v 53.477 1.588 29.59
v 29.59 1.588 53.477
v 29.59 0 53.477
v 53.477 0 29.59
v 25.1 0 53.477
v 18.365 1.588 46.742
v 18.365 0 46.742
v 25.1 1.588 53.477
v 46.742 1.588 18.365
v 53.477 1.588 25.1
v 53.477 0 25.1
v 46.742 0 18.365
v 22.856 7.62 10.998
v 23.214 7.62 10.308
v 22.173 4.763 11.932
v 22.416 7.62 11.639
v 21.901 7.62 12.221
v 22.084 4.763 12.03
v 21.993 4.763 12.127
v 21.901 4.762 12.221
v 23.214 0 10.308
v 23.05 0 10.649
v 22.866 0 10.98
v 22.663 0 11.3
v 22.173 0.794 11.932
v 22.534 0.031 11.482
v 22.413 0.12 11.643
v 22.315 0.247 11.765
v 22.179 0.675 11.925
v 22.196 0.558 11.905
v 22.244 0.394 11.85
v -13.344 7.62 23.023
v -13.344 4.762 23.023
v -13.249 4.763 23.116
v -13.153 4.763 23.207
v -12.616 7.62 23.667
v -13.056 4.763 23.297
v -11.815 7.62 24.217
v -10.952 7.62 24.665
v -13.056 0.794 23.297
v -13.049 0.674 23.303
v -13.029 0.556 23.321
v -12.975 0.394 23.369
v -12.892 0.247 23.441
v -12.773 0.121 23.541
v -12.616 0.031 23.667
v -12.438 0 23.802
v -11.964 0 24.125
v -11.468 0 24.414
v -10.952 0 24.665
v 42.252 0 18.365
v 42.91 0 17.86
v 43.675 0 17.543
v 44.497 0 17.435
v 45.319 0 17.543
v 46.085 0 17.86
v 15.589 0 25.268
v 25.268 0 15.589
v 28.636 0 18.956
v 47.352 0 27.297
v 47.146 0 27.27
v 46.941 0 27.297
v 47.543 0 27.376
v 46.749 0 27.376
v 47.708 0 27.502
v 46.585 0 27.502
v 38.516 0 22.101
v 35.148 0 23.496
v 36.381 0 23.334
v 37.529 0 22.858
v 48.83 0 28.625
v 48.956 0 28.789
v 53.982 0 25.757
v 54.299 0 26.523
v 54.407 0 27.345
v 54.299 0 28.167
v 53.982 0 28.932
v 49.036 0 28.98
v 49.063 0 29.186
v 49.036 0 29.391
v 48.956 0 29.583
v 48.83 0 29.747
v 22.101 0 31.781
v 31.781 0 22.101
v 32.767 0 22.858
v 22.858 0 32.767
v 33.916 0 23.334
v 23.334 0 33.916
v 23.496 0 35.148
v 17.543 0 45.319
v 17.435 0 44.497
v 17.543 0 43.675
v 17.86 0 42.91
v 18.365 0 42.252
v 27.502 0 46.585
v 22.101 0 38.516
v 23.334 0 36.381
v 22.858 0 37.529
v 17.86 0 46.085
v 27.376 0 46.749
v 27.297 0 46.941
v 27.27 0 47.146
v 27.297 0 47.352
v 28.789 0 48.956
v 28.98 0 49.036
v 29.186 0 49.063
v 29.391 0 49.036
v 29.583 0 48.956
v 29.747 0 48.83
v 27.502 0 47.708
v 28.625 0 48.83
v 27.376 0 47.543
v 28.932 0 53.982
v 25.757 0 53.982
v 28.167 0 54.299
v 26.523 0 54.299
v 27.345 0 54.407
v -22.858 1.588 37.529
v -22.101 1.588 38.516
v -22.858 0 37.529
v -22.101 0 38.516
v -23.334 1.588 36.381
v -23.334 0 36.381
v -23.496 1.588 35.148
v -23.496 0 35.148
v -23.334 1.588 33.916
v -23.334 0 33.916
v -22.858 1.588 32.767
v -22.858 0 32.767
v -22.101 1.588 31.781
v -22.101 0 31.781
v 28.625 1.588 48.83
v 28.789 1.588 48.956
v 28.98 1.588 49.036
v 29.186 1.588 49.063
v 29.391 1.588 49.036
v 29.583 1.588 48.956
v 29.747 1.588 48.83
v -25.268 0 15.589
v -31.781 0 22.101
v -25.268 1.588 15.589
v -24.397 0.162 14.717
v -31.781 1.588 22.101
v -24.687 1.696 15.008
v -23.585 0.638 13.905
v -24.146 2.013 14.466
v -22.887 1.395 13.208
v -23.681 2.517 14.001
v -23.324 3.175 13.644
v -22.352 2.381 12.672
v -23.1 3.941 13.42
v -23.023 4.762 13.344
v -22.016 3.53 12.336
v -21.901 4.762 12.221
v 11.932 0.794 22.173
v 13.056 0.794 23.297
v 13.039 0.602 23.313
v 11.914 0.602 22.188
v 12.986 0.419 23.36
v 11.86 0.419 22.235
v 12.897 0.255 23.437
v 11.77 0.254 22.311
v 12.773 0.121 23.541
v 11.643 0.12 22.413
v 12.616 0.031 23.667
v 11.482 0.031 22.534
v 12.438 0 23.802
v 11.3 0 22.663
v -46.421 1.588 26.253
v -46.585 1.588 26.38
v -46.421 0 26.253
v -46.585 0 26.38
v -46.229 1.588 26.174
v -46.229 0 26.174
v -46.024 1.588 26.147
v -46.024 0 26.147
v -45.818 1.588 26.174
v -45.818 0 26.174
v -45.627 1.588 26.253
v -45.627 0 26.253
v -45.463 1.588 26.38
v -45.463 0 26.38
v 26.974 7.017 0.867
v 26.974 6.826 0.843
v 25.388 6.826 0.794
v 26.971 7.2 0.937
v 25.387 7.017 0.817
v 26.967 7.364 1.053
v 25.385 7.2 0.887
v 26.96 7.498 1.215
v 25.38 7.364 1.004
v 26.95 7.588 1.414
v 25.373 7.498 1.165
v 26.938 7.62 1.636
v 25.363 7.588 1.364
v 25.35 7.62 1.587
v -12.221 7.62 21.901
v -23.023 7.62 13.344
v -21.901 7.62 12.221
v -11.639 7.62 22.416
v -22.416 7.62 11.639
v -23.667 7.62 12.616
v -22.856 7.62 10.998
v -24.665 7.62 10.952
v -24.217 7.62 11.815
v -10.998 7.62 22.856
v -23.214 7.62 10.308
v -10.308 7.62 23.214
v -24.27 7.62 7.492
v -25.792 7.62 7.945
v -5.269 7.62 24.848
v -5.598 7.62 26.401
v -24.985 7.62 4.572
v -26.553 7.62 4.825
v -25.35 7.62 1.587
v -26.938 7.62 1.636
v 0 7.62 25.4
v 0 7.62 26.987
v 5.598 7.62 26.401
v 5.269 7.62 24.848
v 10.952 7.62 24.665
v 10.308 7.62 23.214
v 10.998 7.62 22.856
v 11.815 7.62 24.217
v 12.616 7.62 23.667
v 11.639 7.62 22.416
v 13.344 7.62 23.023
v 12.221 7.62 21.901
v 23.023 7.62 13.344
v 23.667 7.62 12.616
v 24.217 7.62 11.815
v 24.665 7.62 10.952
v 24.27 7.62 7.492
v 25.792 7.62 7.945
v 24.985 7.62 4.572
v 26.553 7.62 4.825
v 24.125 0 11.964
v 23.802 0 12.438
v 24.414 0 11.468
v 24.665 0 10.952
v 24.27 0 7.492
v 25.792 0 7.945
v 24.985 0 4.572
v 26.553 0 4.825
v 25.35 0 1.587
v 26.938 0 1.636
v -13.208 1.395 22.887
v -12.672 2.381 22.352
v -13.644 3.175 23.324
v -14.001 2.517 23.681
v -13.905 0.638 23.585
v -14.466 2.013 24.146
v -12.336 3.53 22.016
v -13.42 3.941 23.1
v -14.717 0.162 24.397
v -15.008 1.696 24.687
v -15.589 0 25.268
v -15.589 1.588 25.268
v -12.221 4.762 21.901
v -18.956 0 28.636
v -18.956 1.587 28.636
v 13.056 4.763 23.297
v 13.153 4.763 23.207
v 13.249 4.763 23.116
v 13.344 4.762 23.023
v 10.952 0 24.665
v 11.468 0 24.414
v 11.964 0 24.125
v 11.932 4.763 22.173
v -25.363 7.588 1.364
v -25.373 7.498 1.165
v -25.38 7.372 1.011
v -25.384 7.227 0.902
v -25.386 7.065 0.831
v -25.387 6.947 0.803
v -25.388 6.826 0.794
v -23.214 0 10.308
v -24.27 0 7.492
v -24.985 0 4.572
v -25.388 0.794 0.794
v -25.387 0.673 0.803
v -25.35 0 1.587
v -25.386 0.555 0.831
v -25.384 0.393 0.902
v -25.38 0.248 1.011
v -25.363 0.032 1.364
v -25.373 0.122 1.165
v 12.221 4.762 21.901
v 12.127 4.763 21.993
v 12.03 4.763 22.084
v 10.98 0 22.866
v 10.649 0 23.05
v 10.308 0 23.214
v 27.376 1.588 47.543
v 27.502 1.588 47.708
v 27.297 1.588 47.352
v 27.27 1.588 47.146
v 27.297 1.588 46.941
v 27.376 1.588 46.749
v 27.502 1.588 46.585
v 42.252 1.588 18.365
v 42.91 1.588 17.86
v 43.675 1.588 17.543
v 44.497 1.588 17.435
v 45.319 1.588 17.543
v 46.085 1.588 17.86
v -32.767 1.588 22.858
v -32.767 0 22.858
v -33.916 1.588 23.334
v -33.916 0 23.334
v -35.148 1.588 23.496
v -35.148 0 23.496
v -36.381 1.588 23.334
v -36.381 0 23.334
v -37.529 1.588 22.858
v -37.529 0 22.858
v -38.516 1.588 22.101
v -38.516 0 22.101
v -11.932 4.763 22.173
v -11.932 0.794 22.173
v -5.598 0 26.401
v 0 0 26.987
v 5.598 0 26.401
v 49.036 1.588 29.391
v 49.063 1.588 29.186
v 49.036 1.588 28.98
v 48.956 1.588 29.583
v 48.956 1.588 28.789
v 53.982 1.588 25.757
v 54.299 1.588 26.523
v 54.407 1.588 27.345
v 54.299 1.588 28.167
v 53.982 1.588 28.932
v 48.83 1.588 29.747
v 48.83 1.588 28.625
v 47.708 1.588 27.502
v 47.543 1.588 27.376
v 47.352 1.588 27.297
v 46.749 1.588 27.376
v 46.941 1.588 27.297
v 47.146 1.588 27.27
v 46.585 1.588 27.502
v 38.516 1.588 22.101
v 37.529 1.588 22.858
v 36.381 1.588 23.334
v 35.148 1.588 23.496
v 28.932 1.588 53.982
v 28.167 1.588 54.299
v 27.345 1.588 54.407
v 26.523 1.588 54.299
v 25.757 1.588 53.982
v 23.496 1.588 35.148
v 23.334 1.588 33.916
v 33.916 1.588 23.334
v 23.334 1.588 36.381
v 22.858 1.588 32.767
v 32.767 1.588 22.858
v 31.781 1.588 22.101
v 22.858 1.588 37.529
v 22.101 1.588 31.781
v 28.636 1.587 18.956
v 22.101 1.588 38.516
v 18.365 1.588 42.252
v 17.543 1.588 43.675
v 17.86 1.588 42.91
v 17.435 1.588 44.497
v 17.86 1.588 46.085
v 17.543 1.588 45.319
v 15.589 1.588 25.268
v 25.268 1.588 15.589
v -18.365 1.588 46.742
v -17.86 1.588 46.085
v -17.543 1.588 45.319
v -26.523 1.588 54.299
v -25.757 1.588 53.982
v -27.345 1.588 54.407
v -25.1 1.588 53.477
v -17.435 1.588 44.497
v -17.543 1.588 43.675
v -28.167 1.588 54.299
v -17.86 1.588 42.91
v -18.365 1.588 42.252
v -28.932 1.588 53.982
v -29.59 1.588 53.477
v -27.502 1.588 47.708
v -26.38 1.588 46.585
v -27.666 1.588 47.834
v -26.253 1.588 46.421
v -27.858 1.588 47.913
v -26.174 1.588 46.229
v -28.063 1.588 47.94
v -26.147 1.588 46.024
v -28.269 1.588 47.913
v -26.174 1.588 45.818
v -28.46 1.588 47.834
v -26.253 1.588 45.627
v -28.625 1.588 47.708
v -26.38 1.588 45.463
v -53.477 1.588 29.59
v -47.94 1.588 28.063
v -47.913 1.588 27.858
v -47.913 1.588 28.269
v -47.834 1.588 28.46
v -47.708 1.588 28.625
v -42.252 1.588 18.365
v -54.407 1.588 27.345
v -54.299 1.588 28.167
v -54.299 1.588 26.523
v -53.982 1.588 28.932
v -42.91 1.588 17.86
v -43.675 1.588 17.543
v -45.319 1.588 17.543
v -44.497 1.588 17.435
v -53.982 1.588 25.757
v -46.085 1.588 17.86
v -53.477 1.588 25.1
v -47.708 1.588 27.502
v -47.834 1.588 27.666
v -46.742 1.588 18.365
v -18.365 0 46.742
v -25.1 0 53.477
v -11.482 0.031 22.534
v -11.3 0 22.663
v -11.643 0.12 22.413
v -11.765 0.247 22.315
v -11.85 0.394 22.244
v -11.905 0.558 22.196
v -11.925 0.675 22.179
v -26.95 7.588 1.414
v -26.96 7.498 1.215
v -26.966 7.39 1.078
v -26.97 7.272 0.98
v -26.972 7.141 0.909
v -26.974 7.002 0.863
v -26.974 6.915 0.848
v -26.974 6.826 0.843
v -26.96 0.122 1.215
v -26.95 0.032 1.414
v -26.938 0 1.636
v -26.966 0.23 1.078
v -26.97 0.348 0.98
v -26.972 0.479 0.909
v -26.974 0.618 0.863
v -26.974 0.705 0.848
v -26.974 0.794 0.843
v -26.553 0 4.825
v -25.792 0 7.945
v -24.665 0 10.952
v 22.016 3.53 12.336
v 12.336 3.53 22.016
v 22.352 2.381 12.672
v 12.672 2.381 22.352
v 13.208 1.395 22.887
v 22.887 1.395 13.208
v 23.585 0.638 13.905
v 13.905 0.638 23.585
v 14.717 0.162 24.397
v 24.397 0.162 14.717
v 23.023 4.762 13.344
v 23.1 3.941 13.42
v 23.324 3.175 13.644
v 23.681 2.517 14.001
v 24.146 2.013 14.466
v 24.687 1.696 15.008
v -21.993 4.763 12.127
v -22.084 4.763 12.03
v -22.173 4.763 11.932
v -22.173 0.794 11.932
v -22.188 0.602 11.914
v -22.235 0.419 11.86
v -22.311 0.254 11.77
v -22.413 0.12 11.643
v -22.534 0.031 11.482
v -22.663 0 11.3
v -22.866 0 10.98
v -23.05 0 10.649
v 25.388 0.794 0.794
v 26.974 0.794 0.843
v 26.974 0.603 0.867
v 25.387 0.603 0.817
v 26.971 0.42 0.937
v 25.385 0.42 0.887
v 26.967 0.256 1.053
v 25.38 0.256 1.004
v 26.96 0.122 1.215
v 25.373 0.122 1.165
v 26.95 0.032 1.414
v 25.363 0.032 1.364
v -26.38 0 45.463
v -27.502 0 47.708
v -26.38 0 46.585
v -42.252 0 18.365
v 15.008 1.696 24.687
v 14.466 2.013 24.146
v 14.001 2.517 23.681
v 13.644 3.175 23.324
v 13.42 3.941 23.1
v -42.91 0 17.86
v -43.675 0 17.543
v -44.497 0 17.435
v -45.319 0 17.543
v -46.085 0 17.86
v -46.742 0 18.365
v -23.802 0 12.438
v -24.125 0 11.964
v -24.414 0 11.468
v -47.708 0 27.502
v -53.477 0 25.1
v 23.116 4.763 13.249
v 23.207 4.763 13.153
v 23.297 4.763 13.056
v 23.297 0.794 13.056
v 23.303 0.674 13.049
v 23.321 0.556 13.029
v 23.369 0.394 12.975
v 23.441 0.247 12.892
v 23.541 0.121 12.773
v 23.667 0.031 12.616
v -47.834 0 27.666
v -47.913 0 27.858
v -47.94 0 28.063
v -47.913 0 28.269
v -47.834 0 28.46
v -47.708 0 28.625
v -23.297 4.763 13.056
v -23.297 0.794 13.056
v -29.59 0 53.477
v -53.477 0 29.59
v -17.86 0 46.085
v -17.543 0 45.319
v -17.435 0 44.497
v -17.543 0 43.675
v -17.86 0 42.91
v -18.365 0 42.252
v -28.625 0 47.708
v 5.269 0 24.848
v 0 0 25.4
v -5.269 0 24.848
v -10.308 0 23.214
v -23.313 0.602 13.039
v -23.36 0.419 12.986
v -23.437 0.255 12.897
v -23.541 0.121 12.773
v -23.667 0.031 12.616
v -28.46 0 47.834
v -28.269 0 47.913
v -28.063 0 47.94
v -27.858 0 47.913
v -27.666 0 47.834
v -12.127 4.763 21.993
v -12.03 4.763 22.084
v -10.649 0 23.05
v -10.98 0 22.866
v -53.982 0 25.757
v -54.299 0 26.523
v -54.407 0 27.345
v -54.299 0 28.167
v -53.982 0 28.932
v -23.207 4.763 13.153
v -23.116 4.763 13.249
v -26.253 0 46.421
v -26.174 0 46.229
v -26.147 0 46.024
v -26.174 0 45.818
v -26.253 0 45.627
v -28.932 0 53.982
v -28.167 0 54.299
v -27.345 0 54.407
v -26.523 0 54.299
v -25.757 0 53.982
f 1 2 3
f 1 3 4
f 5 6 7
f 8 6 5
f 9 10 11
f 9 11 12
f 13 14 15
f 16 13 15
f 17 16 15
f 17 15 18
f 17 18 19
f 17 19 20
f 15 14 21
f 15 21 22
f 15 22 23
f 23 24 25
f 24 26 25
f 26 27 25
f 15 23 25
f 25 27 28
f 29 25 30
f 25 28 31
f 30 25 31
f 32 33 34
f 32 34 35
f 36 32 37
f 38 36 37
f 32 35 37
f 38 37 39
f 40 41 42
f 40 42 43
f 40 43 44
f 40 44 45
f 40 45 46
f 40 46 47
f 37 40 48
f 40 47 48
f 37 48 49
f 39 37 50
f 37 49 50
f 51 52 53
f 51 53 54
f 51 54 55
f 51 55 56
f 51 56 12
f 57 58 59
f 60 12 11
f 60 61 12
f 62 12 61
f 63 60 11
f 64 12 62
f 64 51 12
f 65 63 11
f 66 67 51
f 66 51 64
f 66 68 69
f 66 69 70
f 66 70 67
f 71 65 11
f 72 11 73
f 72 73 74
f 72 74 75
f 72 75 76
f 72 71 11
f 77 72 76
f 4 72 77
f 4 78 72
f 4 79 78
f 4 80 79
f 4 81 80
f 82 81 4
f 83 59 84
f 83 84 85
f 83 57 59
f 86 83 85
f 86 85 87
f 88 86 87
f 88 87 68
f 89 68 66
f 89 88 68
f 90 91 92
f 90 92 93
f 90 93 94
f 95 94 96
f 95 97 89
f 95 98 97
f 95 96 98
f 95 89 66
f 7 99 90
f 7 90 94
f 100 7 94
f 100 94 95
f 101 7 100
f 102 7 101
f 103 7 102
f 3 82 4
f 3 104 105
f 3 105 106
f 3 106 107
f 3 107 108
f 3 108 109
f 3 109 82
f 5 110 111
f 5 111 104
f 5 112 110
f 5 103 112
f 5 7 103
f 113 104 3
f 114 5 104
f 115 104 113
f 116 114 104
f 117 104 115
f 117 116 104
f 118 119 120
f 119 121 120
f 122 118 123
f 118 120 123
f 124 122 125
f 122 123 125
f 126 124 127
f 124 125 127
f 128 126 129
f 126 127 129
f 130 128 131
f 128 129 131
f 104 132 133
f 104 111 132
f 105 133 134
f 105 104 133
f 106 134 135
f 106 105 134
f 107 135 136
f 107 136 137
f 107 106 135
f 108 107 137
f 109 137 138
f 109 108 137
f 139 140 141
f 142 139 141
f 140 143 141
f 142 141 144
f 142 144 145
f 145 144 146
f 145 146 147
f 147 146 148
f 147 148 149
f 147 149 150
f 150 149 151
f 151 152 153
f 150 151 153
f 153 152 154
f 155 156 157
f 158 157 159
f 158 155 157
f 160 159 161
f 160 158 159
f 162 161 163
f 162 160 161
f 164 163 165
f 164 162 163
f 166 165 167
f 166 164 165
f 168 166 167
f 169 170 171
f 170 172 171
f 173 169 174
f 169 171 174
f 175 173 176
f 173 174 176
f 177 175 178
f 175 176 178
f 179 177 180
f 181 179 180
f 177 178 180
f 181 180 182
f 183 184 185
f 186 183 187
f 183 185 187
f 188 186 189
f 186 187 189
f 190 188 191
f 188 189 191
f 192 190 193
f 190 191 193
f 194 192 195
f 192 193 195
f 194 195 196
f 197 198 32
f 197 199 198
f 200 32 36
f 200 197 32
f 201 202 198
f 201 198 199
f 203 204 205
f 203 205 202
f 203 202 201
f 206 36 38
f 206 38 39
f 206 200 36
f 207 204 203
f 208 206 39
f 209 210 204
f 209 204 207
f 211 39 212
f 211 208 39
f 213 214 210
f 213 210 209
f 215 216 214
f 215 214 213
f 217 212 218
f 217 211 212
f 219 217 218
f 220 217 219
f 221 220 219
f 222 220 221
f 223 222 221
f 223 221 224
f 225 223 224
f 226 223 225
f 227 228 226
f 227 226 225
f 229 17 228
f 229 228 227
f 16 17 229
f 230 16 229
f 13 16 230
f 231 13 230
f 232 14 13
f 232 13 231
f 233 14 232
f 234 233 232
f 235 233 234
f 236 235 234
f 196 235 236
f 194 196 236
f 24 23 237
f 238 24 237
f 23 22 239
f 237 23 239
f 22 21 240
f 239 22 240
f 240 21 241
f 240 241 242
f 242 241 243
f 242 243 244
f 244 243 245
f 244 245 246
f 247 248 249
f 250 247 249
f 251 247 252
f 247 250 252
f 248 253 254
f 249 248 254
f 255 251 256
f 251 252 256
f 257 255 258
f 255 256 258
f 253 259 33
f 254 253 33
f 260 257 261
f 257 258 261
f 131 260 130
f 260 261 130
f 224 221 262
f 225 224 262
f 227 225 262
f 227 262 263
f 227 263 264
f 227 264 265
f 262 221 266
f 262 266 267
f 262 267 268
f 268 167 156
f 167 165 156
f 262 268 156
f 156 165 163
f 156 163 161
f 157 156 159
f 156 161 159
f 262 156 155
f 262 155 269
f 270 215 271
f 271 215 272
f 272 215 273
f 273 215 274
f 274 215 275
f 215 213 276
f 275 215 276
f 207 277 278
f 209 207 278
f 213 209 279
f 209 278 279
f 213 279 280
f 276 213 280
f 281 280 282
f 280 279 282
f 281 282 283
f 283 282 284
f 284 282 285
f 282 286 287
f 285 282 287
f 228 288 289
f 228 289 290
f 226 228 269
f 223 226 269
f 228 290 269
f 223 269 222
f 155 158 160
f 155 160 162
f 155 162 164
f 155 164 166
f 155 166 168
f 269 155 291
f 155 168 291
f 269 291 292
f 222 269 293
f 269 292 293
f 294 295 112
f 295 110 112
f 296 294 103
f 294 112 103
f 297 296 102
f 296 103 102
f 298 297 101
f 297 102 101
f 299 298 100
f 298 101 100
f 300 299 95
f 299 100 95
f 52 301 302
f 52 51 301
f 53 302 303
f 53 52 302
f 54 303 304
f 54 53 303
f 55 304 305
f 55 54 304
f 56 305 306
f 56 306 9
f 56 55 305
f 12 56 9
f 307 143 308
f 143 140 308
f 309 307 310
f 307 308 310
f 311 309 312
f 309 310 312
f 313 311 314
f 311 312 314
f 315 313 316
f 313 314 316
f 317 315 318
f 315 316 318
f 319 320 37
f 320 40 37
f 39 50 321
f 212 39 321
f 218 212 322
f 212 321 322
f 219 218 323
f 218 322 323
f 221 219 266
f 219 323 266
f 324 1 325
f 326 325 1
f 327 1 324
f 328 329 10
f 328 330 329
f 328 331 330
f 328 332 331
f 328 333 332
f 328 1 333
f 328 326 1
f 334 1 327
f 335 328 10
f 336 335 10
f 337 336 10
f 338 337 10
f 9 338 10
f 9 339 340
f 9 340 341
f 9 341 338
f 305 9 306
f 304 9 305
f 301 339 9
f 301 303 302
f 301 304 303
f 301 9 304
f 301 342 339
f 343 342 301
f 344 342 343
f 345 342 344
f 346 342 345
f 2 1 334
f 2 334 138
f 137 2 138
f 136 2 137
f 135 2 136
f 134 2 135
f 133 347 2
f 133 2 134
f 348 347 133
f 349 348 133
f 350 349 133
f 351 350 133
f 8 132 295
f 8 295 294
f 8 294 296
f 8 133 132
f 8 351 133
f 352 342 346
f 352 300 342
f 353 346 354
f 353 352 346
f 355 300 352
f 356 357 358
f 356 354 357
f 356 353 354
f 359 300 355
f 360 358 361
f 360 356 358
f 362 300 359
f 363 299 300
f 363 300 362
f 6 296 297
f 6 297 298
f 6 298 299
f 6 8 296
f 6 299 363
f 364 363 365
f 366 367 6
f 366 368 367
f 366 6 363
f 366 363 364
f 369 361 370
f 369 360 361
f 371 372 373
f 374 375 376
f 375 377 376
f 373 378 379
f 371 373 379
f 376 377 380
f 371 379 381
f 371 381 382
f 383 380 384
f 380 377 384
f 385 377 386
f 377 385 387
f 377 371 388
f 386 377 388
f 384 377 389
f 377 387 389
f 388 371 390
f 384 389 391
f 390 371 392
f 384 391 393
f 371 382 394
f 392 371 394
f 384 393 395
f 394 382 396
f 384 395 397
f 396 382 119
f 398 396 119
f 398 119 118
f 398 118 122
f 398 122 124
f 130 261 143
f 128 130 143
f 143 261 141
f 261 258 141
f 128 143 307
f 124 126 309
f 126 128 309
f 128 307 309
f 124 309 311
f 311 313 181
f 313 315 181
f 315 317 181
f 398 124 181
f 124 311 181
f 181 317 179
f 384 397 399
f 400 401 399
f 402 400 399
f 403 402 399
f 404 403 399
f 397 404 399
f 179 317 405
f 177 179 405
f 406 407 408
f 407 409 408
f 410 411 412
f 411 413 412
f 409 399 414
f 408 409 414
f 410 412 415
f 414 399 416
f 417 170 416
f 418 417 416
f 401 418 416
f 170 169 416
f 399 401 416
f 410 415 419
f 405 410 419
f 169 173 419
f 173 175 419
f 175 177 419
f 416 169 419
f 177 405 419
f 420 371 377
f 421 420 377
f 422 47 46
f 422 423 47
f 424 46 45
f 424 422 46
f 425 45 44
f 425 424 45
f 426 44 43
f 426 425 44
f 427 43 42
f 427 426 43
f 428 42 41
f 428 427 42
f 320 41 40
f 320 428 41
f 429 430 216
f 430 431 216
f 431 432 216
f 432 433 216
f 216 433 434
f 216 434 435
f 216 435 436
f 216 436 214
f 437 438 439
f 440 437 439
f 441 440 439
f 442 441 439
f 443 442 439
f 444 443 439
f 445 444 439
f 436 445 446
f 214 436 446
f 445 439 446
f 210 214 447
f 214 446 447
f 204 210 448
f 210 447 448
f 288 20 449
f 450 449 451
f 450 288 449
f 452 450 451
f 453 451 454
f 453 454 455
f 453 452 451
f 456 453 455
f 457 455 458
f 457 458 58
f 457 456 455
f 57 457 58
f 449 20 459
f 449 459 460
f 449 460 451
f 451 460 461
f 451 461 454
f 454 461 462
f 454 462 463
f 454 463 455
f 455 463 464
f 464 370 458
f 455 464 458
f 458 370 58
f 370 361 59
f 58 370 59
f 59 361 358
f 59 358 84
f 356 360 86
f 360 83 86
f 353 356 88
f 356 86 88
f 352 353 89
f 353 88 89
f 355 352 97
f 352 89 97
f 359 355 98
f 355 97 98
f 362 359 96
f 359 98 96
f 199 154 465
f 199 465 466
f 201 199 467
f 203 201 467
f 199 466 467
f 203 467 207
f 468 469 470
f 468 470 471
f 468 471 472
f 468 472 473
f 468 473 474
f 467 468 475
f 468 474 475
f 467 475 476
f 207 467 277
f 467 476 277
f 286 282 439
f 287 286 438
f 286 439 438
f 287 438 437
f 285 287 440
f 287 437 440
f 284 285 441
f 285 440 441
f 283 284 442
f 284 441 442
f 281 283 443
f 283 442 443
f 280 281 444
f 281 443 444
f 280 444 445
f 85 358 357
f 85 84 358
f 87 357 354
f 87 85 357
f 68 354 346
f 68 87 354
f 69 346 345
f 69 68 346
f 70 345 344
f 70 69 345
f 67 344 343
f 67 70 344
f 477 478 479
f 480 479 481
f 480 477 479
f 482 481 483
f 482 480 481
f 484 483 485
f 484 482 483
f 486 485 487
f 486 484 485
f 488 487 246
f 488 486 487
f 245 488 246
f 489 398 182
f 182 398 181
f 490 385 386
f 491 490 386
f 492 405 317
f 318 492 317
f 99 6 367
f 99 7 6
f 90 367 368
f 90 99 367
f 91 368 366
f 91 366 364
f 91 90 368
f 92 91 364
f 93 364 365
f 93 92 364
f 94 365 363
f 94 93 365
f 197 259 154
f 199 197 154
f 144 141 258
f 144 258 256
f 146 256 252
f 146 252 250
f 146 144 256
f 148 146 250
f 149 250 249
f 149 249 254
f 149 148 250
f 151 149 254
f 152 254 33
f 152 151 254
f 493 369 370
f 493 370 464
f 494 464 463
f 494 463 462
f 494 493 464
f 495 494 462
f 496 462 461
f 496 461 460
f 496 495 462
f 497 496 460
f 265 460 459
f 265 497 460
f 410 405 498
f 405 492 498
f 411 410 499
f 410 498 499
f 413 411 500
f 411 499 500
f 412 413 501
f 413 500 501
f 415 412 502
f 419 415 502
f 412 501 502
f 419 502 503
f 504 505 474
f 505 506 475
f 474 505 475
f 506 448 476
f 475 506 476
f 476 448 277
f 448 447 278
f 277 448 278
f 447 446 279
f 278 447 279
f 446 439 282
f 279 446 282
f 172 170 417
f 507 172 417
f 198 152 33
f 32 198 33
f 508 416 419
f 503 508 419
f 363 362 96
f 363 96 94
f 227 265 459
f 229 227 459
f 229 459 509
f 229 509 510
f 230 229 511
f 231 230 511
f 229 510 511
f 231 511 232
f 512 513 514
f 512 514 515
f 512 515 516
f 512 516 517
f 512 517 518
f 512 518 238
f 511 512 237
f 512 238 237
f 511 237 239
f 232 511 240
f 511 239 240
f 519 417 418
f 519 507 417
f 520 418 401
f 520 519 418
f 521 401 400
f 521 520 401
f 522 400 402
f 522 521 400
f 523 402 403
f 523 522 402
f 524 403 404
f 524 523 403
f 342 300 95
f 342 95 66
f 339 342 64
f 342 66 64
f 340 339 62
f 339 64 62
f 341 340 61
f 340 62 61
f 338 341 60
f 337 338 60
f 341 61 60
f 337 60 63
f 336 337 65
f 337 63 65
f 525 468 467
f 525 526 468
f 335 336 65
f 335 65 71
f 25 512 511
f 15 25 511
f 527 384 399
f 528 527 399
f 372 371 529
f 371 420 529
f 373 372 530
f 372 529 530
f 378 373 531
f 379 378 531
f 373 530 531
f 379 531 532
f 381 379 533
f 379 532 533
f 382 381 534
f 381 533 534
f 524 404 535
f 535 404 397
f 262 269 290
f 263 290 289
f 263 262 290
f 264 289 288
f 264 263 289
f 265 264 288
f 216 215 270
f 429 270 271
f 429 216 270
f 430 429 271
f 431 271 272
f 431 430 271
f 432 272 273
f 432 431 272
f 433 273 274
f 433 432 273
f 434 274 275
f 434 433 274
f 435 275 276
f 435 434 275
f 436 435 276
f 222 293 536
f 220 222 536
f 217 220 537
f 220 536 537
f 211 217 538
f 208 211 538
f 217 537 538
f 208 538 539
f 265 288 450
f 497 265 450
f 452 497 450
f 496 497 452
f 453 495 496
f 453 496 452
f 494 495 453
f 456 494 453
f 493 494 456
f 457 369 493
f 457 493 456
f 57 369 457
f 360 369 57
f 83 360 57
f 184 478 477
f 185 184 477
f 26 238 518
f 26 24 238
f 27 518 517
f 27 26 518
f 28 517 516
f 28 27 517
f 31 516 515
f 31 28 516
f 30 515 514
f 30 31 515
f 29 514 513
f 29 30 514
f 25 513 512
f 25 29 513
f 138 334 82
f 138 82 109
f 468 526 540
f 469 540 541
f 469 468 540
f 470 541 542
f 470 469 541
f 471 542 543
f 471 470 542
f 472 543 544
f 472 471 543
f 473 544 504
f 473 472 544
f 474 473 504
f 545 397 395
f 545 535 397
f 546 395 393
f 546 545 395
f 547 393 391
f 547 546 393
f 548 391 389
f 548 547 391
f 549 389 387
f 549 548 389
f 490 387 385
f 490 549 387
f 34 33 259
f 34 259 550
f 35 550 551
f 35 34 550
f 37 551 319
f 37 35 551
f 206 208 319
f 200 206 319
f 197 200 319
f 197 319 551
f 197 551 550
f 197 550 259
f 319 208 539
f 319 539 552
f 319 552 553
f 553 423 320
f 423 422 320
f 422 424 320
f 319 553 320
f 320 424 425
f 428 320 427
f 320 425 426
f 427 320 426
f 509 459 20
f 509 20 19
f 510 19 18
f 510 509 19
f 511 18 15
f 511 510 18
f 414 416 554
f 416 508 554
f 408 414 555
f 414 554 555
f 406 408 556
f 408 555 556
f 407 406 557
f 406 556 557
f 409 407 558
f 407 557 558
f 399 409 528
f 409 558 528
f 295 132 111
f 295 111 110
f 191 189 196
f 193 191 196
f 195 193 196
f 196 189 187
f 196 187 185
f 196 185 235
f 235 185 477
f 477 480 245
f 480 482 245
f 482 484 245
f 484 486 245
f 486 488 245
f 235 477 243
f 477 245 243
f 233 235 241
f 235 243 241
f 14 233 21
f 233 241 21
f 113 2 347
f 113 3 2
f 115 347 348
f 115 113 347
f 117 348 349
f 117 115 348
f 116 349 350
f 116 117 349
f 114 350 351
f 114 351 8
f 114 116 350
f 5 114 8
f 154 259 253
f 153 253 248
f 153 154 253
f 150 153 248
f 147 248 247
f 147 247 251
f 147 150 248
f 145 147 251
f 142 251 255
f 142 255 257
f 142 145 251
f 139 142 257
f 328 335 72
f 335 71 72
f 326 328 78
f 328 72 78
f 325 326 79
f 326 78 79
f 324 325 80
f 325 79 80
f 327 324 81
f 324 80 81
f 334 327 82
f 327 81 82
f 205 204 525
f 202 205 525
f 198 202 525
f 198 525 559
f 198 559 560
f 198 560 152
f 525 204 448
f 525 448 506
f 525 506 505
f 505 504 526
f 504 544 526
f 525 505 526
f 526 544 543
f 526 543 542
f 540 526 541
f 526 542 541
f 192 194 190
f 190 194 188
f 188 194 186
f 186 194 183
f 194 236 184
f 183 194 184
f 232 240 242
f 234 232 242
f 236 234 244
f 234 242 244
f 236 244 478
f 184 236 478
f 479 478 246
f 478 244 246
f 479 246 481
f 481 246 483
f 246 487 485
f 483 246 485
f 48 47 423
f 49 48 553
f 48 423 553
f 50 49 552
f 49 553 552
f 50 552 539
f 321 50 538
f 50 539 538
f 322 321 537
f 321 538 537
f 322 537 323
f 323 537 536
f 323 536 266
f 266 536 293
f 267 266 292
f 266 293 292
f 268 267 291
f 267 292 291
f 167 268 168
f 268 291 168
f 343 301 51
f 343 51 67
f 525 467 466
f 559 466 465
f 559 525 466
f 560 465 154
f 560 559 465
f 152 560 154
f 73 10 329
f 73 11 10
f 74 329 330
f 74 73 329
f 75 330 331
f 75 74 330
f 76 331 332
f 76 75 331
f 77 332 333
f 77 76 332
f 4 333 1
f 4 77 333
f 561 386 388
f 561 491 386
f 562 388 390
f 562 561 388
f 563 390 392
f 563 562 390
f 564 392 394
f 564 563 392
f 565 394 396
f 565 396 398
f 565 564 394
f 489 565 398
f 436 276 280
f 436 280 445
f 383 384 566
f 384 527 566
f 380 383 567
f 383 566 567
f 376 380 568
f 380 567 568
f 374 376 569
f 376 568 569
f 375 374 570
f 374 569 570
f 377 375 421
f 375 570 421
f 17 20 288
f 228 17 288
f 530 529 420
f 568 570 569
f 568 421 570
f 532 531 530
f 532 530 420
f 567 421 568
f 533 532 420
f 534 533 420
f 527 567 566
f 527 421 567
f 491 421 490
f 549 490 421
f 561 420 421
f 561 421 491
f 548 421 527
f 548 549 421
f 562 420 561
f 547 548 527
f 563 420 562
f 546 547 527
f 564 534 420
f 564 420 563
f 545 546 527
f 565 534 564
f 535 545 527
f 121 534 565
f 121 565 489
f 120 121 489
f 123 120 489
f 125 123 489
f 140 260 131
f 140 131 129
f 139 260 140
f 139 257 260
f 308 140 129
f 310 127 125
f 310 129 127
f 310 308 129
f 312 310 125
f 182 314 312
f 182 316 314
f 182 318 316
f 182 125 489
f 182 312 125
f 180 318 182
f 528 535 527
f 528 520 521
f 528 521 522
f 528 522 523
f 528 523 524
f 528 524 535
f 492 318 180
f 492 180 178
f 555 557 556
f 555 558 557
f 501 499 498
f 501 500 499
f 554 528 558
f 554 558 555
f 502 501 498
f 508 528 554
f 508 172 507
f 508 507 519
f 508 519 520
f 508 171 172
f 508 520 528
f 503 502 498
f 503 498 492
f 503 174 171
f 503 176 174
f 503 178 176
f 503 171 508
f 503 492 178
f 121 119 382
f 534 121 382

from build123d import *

# Parameters (mm, degrees)
BASE_FLANGE1_DEPTH             = 7.62
EDGE_FLANGE1_STRIP_W           = 12.7
EDGE_FLANGE1_STRIP_H           = 1.5875
EDGE_FLANGE1_STRIP_CUT_DEPTH   = 13.689174868
EDGE_FLANGE1_STRIP_2_W         = 12.7
EDGE_FLANGE1_STRIP_2_H         = 1.5875
EDGE_FLANGE1_STRIP_CUT_2_DEPTH = 13.689174868
EDGE_FLANGE1_DEPTH             = 13.689174868
EDGE_FLANGE1_BEND_DEPTH        = 13.689174868
SKETCH12_W                     = 0.396875
SKETCH12_H                     = 4.784490506
SKETCH12_H_2                   = 4.782978668
CUT_EXTRUDE3_DEPTH             = 25.4
SKETCH13_W                     = 0.396875
SKETCH13_H                     = 4.7625
CUT_EXTRUDE4_DEPTH             = 25.4
FILLET2_R                      = 0.79375
BOSS_EXTRUDE1_DEPTH            = 1.5875
FILLET3_R                      = 3.175
FILLET4_R                      = 4.7625
FILLET5_R                      = 0.79375


# Read off the part's stored shape, not the designer's step: Base-Flange1
# Sheet-metal steps are written as plain solids
with BuildPart() as part:
    # Base-Flange1 outline → Base-Flange1 (new body)
    with BuildSketch(Plane(origin=(0, 0, 0), x_dir=(1, 0, 0), z_dir=(0, 1, 0))):
        with BuildLine():
            ThreePointArc((24.665208878, -10.952288676), (26.30984284, -6.00976921), (26.974319291, -0.843359375))
            Line((26.974319291, -0.843359375), (25.387594627, -0.79375))
            ThreePointArc((25.387594627, -0.79375), (24.762205026, -5.656253374), (23.214314238, -10.308036401))
            ThreePointArc((23.214314238, -10.308036401), (22.645724221, -11.325105064), (21.900863739, -12.221155361))
            Line((21.900863739, -12.221155361), (12.221155361, -21.900863739))
            ThreePointArc((12.221155361, -21.900863739), (11.325105064, -22.645724221), (10.308036401, -23.214314238))
            ThreePointArc((10.308036401, -23.214314238), (0, -25.4), (-10.308036401, -23.214314238))
            ThreePointArc((-10.308036401, -23.214314238), (-11.325105064, -22.645724221), (-12.221155361, -21.900863739))
            Line((-12.221155361, -21.900863739), (-21.900863739, -12.221155361))
            ThreePointArc((-21.900863739, -12.221155361), (-22.645724221, -11.325105064), (-23.214314238, -10.308036401))
            ThreePointArc((-23.214314238, -10.308036401), (-24.762205026, -5.656253374), (-25.387594627, -0.79375))
            Line((-25.387594627, -0.79375), (-26.974319291, -0.843359375))
            ThreePointArc((-26.974319291, -0.843359375), (-26.30984284, -6.00976921), (-24.665208878, -10.952288676))
            ThreePointArc((-24.665208878, -10.952288676), (-23.954471356, -12.223624504), (-23.023395754, -13.343687376))
            Line((-23.023395754, -13.343687376), (-13.343687376, -23.023395754))
            ThreePointArc((-13.343687376, -23.023395754), (-12.223624504, -23.954471356), (-10.952288676, -24.665208878))
            ThreePointArc((-10.952288676, -24.665208878), (0, -26.9875), (10.952288676, -24.665208878))
            ThreePointArc((10.952288676, -24.665208878), (12.223624504, -23.954471356), (13.343687376, -23.023395754))
            Line((13.343687376, -23.023395754), (23.023395754, -13.343687376))
            ThreePointArc((23.023395754, -13.343687376), (23.954471356, -12.223624504), (24.665208878, -10.952288676))
        make_face()
    extrude(amount=BASE_FLANGE1_DEPTH)

    # Edge-Flange1 strip (across the edge) → Edge-Flange1 strip cut (cut)
    with BuildSketch(Plane(origin=(-23.023395754, 0, 13.343687376), x_dir=(0, 1, 0), z_dir=(0.7071067811865437, 0, 0.7071067811865515))):
        with Locations((-1.5875, -0.79375)):
            Rectangle(EDGE_FLANGE1_STRIP_W, EDGE_FLANGE1_STRIP_H)
    extrude(amount=EDGE_FLANGE1_STRIP_CUT_DEPTH, mode=Mode.SUBTRACT)

    # Edge-Flange1 strip 2 (across the edge) → Edge-Flange1 strip cut 2 (cut)
    with BuildSketch(Plane(origin=(13.343687376, 0, 23.023395754), x_dir=(0, 1, 0), z_dir=(0.7071067811865512, 0, -0.7071067811865438))):
        with Locations((-1.5875, -0.79375)):
            Rectangle(EDGE_FLANGE1_STRIP_2_W, EDGE_FLANGE1_STRIP_2_H)
    extrude(amount=EDGE_FLANGE1_STRIP_CUT_2_DEPTH, mode=Mode.SUBTRACT)

    # Edge-Flange1 section (across the edge) → Edge-Flange1 (add)
    with BuildSketch(Plane(origin=(-23.023395754, 0, 13.343687376), x_dir=(0, 1, 0), z_dir=(0.7071067811865437, 0, 0.7071067811865515))):
        with BuildLine():
            Line((0, 3.175), (0, 7.9375))
            Line((0, 7.9375), (1.5875, 7.9375))
            Line((1.5875, 7.9375), (1.5875, 3.175))
            ThreePointArc((1.5875, 3.175), (2.51743597, 0.92993597), (4.7625, 0))
            Line((4.7625, 0), (4.7625, -1.5875))
            ThreePointArc((4.7625, -1.5875), (1.394903955, -0.192596045), (0, 3.175))
        make_face()
    extrude(amount=EDGE_FLANGE1_DEPTH)

    # Edge-Flange1 section 2 (across the edge) → Edge-Flange1 bend (add)
    with BuildSketch(Plane(origin=(13.343687376, 0, 23.023395754), x_dir=(0, 1, 0), z_dir=(0.7071067811865512, 0, -0.7071067811865438))):
        with BuildLine():
            Line((0, 3.175), (0, 7.9375))
            Line((0, 7.9375), (1.5875, 7.9375))
            Line((1.5875, 7.9375), (1.5875, 3.175))
            ThreePointArc((1.5875, 3.175), (2.51743597, 0.92993597), (4.7625, 0))
            Line((4.7625, 0), (4.7625, -1.5875))
            ThreePointArc((4.7625, -1.5875), (1.394903955, -0.192596045), (0, 3.175))
        make_face()
    extrude(amount=EDGE_FLANGE1_BEND_DEPTH)

    # Sketch12 → Cut-Extrude3 (cut)
    with BuildSketch(Plane(origin=(-23.796201641, 0, 23.796201641), x_dir=(0.7071067811865438, 3.532708032038459e-15, 0.7071067811865512), z_dir=(-0.7071067811865512, -3.532708032038497e-15, 0.7071067811865438))):
        with Locations((7.043024934, 2.370254747)):
            Rectangle(SKETCH12_W, SKETCH12_H)
        with Locations((-7.043024934, 2.371010666)):
            Rectangle(SKETCH12_W, SKETCH12_H_2)
    extrude(amount=-CUT_EXTRUDE3_DEPTH, mode=Mode.SUBTRACT)

    # Sketch13 → Cut-Extrude4 (cut)
    with BuildSketch(Plane(origin=(23.796201641, 0, 23.796201641), x_dir=(0.7071067811865513, 3.414951097637176e-15, -0.7071067811865437), z_dir=(0.7071067811865437, -3.414951097637212e-15, 0.7071067811865513))):
        with Locations((7.043024934, 2.38125)):
            Rectangle(SKETCH13_W, SKETCH13_H)
        with Locations((-7.043024934, 2.38125)):
            Rectangle(SKETCH13_W, SKETCH13_H)
    extrude(amount=-CUT_EXTRUDE4_DEPTH, mode=Mode.SUBTRACT)

    # Fillet2
    fillet2_edges = [part.edges().sort_by_distance(p)[0] for p in [
        (-12.493889076, 0, 22.734863462),
        (-22.734863462, 0, 12.493889076),
        (-26.180956959, 0, 0.818554688),
        (22.734863462, 0, 12.493889076),
        (26.180956959, 0, 0.818554688),
        (12.493889076, 0, 22.734863462),
        (-26.180956959, 7.62, 0.818554688),
        (26.180956959, 7.62, 0.818554688),
    ]]
    fillet(fillet2_edges, radius=FILLET2_R)

    # Sketch4 → Boss-Extrude1 (add)
    # profile 1 of 2: a face of its own
    with BuildSketch(Plane(origin=(0, 1.5875, 0), x_dir=(1, 0, 0), z_dir=(0, 1, 0))):
        Polygon((-18.956347452, -28.63605583), (-25.46851022, -35.148218598), (-16.119559737, -44.49716908), (-27.344879889, -55.722489231), (-55.722489231, -27.344879889), (-44.49716908, -16.119559737), (-35.148218598, -25.46851022), (-28.63605583, -18.956347452), align=None)
        Polygon((-48.268876651, -28.063300378), (-28.063300378, -48.268876651), (-25.818236348, -46.02381262), (-46.02381262, -25.818236348), align=None, mode=Mode.SUBTRACT)
    # profile 2 of 2: a face of its own
    with BuildSketch(Plane(origin=(0, 1.5875, 0), x_dir=(1, 0, 0), z_dir=(0, 1, 0))):
        Polygon((18.956347452, -28.63605583), (25.46851022, -35.148218598), (16.119559737, -44.49716908), (27.344879889, -55.722489231), (55.722489231, -27.344879889), (44.49716908, -16.119559737), (35.148218598, -25.46851022), (28.63605583, -18.956347452), align=None)
        Polygon((29.185832393, -49.391408666), (26.940768363, -47.146344636), (47.146344636, -26.940768363), (49.391408666, -29.185832393), align=None, mode=Mode.SUBTRACT)
    extrude(amount=-BOSS_EXTRUDE1_DEPTH)

    # Fillet3
    fillet3_edges = [part.edges().sort_by_distance(p)[0] for p in [
        (-16.119559737, 0.79375, 44.49716908),
        (-27.344879889, 0.79375, 55.722489231),
        (-55.722489231, 0.79375, 27.344879889),
        (-44.49716908, 0.79375, 16.119559737),
        (44.49716908, 0.79375, 16.119559737),
        (55.722489231, 0.79375, 27.344879889),
        (27.344879889, 0.79375, 55.722489231),
        (16.119559737, 0.79375, 44.49716908),
    ]]
    fillet(fillet3_edges, radius=FILLET3_R)

    # Fillet4
    fillet4_edges = [part.edges().sort_by_distance(p)[0] for p in [
        (-25.46851022, 0.79375, 35.148218598),
        (-35.148218598, 0.79375, 25.46851022),
        (35.148218598, 0.79375, 25.46851022),
        (25.46851022, 0.79375, 35.148218598),
    ]]
    fillet(fillet4_edges, radius=FILLET4_R)

    # Fillet5
    fillet5_edges = [part.edges().sort_by_distance(p)[0] for p in [
        (-46.02381262, 0.79375, 25.818236348),
        (-25.818236348, 0.79375, 46.02381262),
        (-28.063300378, 0.79375, 48.268876651),
        (-48.268876651, 0.79375, 28.063300378),
        (29.185832393, 0.79375, 49.391408666),
        (26.940768363, 0.79375, 47.146344636),
        (47.146344636, 0.79375, 26.940768363),
        (49.391408666, 0.79375, 29.185832393),
    ]]
    fillet(fillet5_edges, radius=FILLET5_R)


solid = part.part
